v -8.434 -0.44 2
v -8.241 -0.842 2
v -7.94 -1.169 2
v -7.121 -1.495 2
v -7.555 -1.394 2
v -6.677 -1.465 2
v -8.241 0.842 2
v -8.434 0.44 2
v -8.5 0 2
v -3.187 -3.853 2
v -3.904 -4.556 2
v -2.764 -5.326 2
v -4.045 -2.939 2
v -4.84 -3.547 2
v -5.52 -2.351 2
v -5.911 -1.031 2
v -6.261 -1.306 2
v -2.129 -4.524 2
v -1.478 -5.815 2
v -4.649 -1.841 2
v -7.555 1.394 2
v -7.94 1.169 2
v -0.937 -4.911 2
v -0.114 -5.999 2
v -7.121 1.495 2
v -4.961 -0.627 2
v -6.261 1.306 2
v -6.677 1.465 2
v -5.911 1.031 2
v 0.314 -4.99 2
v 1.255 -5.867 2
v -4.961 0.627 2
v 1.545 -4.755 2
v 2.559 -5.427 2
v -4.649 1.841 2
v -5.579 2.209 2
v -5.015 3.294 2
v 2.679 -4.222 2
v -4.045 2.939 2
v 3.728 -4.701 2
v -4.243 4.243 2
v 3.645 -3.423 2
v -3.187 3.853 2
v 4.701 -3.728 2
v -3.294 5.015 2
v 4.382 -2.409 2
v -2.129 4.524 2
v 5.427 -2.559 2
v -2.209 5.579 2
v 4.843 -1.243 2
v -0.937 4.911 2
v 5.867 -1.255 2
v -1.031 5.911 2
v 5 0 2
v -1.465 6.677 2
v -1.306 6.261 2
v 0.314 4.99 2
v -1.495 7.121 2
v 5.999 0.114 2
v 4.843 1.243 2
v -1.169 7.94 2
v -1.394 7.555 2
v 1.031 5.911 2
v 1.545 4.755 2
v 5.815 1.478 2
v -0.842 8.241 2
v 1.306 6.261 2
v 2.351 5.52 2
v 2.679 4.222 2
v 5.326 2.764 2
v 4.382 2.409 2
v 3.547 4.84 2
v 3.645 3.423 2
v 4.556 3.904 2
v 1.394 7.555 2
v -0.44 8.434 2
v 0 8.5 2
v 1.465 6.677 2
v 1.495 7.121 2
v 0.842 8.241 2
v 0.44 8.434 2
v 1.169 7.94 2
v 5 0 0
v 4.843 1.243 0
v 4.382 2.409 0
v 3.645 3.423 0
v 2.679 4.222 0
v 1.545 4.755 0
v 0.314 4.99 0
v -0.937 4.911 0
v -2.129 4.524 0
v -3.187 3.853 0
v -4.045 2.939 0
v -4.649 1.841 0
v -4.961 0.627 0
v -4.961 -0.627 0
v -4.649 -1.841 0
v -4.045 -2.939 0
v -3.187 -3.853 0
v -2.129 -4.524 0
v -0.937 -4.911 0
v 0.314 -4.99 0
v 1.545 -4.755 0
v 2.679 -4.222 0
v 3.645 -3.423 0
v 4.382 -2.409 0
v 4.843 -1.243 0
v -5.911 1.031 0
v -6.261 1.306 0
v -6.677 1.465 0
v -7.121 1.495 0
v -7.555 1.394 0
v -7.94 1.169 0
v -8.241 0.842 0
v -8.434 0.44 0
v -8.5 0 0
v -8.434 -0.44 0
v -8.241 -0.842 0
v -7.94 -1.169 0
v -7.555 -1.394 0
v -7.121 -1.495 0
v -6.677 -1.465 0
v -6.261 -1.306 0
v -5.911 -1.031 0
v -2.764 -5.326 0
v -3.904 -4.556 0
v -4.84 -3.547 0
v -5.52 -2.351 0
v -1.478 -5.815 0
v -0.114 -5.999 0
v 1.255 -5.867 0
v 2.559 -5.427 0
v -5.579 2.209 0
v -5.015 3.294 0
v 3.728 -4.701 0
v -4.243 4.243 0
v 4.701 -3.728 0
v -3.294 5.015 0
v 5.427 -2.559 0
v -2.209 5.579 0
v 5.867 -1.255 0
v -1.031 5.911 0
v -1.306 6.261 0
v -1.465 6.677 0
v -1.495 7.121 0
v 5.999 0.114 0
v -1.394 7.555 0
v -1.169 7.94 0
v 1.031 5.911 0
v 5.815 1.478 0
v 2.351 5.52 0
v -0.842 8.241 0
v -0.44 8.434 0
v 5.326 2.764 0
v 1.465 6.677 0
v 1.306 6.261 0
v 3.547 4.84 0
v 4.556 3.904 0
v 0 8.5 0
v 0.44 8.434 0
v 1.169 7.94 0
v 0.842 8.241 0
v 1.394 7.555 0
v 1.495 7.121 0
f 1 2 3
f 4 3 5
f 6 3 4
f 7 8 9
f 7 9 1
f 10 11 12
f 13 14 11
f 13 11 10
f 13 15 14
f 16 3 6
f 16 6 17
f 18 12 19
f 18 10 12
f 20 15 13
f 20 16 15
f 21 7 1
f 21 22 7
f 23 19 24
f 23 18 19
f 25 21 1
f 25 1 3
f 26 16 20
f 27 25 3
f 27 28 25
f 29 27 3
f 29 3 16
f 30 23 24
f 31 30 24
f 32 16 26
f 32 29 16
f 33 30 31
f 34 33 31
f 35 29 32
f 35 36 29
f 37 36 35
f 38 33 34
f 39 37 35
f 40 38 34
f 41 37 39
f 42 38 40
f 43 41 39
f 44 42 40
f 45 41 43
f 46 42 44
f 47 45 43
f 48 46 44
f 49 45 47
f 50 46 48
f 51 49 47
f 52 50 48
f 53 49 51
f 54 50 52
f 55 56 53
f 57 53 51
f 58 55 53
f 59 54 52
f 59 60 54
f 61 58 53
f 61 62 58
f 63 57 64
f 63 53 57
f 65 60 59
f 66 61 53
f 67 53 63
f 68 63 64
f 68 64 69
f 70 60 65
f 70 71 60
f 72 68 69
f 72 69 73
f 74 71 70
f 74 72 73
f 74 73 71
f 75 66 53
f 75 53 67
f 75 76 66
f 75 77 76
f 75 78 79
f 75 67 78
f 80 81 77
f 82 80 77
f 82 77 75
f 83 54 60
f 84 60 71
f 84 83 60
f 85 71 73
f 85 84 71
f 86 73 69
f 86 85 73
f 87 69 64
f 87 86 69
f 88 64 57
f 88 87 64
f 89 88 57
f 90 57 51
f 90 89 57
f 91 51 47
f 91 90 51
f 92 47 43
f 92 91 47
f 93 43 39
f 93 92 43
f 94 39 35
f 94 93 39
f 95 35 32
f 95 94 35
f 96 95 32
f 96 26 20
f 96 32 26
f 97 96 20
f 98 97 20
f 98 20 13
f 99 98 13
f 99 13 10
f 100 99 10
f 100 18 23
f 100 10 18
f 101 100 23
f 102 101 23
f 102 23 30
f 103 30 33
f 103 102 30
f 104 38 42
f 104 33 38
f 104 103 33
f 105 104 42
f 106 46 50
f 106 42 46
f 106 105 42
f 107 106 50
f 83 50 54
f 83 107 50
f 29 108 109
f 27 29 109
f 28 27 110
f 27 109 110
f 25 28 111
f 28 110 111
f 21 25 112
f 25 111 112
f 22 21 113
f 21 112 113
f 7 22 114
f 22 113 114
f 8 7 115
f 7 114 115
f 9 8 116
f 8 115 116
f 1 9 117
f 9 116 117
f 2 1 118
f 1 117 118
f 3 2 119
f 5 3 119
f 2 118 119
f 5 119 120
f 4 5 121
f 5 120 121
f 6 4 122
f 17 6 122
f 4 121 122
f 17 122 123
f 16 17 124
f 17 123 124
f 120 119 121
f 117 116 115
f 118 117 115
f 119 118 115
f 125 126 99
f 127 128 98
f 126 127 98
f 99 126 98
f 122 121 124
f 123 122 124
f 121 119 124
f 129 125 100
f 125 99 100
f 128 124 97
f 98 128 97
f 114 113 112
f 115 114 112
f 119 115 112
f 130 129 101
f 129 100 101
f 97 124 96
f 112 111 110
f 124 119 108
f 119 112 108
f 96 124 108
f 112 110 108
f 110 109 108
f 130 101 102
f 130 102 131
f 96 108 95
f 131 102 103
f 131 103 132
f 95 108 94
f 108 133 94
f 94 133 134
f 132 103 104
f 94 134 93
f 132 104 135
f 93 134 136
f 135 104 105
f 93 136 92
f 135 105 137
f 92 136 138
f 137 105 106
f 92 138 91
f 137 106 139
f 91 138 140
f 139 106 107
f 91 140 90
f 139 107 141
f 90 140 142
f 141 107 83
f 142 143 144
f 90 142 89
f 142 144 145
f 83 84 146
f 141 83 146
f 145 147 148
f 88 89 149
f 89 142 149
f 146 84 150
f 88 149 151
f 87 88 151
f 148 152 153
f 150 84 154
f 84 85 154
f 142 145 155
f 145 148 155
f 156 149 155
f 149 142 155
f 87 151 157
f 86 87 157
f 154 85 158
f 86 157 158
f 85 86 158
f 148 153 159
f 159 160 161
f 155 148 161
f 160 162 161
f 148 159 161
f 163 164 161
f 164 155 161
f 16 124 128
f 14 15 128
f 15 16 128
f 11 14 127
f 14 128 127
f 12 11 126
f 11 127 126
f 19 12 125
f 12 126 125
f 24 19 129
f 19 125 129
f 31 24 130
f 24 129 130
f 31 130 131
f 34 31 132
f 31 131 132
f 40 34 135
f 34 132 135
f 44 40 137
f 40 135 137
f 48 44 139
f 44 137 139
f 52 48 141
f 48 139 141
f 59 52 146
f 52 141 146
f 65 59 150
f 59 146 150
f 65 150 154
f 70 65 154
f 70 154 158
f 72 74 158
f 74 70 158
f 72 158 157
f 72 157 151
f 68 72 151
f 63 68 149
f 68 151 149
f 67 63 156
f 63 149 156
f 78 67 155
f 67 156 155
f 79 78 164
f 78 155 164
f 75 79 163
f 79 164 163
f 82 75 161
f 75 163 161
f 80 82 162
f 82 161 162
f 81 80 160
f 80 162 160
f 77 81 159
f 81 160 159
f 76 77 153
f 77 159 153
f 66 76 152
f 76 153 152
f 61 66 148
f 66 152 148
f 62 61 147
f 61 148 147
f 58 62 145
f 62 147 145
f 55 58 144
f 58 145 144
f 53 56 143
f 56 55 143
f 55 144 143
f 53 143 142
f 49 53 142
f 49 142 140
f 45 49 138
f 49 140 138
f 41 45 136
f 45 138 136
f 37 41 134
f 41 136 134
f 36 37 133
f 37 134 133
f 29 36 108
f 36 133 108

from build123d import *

# Parameters (mm, degrees)
CYLINDER003_R     = 1.5
CYLINDER003_DEPTH = 2
CYLINDER001_R     = 5
CYLINDER001_DEPTH = 3
CYLINDER_R        = 6
CYLINDER_DEPTH    = 2
CYLINDER002_R     = 1.5
CYLINDER002_DEPTH = 2


with BuildPart() as cylinder003:
    # Cylinder003 → Cylinder003 (new body)
    with BuildSketch(Plane(origin=(0, 7, 0), x_dir=(1, 0, 0), z_dir=(0, 0, 1))):
        Circle(CYLINDER003_R)
    extrude(amount=CYLINDER003_DEPTH)


with BuildPart() as cylinder001:
    # Cylinder001 → Cylinder001 (new body)
    with BuildSketch(Plane.XY):
        Circle(CYLINDER001_R)
    extrude(amount=CYLINDER001_DEPTH)


with BuildPart() as cut:
    # Cylinder → Cylinder (new body)
    with BuildSketch(Plane.XY):
        Circle(CYLINDER_R)
    extrude(amount=CYLINDER_DEPTH)

    # Cut: cut Cylinder001
    add(cylinder001.part, mode=Mode.SUBTRACT)


with BuildPart() as fusion:
    # Cylinder002 → Cylinder002 (new body)
    with BuildSketch(Plane(origin=(-7, 0, 0), x_dir=(1, 0, 0), z_dir=(0, 0, 1))):
        Circle(CYLINDER002_R)
    extrude(amount=CYLINDER002_DEPTH)

    # Fusion: union Cylinder003, Cut
    add(cylinder003.part)
    add(cut.part)


solid = fusion.part
